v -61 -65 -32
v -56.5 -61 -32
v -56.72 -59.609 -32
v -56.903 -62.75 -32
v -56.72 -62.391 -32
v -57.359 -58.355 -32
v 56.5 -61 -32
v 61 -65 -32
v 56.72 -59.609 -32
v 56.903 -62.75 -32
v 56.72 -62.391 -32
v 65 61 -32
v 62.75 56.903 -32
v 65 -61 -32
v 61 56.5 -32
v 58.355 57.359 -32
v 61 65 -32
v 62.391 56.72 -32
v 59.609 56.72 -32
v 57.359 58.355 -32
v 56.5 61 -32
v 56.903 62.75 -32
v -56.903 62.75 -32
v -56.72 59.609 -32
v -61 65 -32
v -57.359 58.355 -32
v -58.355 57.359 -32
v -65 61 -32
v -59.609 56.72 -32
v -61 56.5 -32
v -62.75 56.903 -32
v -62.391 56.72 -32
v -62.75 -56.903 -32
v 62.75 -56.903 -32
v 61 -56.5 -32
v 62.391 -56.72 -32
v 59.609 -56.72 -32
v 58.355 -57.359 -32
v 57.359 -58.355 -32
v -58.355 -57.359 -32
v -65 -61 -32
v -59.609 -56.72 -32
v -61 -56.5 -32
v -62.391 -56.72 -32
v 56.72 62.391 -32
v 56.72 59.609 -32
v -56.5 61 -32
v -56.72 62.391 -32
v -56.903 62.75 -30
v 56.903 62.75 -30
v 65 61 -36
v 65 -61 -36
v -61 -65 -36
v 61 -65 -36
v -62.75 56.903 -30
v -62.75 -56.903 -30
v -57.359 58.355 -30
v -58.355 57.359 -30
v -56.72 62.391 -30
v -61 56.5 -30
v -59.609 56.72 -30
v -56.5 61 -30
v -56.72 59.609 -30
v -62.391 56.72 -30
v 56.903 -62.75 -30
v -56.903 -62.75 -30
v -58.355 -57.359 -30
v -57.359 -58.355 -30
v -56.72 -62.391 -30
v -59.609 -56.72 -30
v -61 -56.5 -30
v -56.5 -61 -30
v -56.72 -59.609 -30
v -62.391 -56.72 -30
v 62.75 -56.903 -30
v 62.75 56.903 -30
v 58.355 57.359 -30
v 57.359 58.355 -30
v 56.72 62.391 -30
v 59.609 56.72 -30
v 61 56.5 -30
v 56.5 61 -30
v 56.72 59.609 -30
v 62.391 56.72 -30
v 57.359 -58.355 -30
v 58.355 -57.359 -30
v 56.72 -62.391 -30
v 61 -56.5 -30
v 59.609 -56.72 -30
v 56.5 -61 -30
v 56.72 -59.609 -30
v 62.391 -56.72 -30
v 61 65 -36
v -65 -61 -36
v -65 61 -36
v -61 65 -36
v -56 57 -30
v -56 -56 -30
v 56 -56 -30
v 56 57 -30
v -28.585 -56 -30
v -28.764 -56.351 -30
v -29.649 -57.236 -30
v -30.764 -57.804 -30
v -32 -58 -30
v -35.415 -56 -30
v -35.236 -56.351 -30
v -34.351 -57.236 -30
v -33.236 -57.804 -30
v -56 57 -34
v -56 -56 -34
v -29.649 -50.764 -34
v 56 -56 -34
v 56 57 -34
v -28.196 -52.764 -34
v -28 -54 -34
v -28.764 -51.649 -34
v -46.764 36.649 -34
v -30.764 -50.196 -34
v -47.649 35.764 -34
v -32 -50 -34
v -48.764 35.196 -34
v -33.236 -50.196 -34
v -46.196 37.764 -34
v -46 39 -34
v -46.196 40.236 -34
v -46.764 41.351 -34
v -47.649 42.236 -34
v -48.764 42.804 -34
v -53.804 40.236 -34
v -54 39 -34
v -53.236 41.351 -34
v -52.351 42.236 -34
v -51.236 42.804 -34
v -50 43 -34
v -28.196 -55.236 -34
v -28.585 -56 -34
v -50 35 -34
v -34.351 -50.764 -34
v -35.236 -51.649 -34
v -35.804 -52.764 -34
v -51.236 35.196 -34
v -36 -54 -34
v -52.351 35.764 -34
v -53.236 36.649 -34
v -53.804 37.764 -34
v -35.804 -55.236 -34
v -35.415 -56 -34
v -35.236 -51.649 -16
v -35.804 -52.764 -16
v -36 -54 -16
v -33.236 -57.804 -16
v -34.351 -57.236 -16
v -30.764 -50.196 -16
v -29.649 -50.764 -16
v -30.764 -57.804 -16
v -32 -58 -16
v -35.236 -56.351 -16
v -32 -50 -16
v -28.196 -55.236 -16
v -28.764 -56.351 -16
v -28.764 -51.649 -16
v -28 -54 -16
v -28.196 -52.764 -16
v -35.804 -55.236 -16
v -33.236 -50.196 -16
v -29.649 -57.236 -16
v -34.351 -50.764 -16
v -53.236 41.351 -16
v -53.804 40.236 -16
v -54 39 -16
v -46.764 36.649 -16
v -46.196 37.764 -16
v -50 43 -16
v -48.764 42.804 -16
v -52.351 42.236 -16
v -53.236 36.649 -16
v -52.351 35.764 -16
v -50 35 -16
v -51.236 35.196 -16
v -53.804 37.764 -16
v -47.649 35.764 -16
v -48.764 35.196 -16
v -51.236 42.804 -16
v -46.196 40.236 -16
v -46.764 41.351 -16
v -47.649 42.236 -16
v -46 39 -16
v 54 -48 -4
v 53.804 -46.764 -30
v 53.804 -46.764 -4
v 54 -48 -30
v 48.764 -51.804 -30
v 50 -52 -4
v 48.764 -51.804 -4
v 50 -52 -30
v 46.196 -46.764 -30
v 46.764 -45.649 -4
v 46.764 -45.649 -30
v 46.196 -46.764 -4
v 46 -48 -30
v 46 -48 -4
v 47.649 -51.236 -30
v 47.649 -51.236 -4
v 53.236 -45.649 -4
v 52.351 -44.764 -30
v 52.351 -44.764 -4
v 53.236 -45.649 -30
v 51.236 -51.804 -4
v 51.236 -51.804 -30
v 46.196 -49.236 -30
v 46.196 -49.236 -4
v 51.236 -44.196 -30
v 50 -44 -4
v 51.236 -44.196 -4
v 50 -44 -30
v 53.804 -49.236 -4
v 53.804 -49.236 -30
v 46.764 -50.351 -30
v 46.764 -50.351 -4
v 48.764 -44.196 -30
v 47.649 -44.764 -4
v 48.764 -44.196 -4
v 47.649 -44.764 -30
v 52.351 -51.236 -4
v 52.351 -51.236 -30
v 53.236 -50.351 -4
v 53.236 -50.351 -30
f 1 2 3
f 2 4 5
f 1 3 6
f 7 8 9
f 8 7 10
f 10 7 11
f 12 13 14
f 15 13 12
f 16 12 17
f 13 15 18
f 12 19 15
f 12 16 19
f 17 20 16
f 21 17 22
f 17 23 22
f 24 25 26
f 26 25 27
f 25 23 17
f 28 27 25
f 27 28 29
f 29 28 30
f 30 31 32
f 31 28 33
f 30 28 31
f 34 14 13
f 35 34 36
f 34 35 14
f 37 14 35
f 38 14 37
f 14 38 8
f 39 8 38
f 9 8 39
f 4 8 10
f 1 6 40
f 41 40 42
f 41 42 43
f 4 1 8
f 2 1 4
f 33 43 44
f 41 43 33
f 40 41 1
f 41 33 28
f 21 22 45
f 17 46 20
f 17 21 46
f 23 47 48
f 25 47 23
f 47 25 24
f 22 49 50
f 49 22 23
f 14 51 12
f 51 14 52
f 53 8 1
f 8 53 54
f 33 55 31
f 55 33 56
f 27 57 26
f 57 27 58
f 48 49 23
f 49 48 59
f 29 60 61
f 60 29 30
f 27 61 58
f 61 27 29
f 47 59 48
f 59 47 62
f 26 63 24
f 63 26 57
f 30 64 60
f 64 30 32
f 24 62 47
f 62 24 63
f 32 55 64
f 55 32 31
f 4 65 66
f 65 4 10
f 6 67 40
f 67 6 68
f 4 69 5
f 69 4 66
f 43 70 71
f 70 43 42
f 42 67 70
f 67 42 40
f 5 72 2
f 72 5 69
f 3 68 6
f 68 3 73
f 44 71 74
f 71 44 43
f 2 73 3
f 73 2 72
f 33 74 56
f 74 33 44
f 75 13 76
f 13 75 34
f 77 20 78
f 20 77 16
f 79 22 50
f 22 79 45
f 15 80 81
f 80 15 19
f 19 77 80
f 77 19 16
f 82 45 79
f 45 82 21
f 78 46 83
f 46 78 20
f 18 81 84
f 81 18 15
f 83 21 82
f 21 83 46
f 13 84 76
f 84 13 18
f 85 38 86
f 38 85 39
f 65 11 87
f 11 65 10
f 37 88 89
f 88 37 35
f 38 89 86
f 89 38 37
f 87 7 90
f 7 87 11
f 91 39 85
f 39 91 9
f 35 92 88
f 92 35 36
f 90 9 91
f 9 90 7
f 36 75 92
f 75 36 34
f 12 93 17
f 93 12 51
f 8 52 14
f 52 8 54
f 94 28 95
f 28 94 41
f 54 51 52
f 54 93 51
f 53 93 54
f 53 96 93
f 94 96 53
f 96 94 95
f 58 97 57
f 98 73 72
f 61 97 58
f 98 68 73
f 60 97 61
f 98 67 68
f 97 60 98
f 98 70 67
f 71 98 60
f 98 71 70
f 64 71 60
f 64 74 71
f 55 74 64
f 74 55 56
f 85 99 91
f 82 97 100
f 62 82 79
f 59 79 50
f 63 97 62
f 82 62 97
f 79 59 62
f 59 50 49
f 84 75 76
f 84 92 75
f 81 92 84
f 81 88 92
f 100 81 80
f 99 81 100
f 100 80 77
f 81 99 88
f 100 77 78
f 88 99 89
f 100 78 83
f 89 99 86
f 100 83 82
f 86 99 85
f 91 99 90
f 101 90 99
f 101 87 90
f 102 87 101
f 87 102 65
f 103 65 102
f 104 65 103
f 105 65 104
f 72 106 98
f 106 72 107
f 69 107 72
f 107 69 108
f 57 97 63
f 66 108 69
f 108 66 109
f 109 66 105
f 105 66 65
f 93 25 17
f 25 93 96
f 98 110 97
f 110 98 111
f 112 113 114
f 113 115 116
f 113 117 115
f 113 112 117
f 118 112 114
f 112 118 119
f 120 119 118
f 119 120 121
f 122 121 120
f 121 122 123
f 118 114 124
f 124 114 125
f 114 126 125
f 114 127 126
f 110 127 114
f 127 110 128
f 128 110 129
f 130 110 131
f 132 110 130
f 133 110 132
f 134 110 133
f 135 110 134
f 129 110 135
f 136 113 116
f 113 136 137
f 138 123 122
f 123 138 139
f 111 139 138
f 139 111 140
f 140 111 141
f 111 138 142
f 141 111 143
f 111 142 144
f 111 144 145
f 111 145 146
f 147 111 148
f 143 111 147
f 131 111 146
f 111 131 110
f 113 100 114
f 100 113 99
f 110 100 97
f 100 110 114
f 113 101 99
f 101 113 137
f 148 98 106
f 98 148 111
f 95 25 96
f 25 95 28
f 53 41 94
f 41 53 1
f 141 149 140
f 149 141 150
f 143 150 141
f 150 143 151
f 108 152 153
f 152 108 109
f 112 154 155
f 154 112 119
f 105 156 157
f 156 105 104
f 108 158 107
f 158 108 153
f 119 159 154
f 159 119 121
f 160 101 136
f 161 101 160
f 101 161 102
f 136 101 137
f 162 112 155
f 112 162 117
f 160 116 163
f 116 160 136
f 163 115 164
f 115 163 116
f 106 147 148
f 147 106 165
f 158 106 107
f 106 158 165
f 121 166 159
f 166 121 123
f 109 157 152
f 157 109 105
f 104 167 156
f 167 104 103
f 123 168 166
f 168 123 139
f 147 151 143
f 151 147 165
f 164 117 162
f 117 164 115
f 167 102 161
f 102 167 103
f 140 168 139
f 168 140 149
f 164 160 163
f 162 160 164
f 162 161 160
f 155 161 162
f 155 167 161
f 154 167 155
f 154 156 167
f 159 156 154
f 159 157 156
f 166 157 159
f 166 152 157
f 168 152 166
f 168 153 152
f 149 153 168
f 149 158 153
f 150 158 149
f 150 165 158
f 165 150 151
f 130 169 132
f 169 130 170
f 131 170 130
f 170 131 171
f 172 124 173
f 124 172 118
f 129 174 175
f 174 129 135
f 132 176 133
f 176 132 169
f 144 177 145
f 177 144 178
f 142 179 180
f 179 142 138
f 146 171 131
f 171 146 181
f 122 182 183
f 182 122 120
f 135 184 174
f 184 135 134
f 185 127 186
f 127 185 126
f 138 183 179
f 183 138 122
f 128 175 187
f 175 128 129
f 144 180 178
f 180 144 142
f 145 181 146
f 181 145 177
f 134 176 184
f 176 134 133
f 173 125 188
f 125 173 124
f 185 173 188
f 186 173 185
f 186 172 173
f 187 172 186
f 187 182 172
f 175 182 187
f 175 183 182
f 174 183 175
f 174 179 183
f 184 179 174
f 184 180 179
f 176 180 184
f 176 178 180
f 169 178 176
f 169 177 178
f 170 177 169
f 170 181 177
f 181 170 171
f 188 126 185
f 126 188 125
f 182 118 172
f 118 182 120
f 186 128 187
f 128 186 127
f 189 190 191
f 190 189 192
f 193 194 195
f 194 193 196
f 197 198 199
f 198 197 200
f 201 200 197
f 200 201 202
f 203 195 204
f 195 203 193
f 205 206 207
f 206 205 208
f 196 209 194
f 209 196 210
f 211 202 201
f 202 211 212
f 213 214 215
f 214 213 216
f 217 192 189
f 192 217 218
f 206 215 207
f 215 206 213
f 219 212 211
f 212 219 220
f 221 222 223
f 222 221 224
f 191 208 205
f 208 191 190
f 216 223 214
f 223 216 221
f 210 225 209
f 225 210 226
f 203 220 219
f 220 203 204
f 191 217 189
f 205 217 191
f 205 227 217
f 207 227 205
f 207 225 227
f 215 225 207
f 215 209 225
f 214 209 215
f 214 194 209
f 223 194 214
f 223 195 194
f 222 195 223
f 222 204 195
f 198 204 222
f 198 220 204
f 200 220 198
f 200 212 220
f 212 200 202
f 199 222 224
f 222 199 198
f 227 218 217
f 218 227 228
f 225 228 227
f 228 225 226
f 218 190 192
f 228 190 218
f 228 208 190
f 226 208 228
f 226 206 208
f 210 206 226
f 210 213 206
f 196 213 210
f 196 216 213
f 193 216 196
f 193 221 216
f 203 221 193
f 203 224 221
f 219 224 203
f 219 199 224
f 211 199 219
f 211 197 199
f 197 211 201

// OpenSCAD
base_thickness = 2;
standoff_height = 8;
base_width = 130;
base_height = 130;
bottom_wall_height = 30;
wall_thickness = 2;
top_offset = -2;
//top_offset = 10;

$fn=20;


module bottom() {
    color("Green") {
        translate([-(base_width/2),-(base_height/2),0]) {
            cube([base_width, base_height, base_thickness]);
        }
    }
}

module arduino_standoffs() {
    // relay standoffs
    color("Yellow") {
        translate([10, 53, 0]) {
            cylinder(h=standoff_height, r=4);
        }
        translate([15, 0, 0]) {
            cylinder(h=standoff_height, r=4);
        }
        translate([43, 0, 0]) {
            cylinder(h=standoff_height, r=4);
        }
        translate([58, 50, 0]) {
            cylinder(h=standoff_height, r=4);
        }        
    }
    color("Orange") {
        translate([10, 53, standoff_height]) {
            cylinder(h=4, r=1);
        }
        translate([15, 0, standoff_height]) {
            cylinder(h=4, r=1);
        }
        translate([43, 0, standoff_height]) {
            cylinder(h=4, r=1);
        }
        translate([58, 50, standoff_height]) {
            cylinder(h=4, r=1);
        }        
    }
} 

module relay_standoffs() {
    color("Red") {
        translate([0, 0, 0]) {
            cylinder(h=standoff_height, r=4);
        }
        translate([0, 28, 0]) {
            cylinder(h=standoff_height, r=4);
        }
        translate([22, 0, 0]) {
            cylinder(h=standoff_height, r=4);
        }
        translate([22, 28, 0]) {
            cylinder(h=standoff_height, r=4);
        }        
    }
    color("Purple") {
        translate([0, 0, standoff_height]) {
            cylinder(h=4, r=1);
        }
        translate([0, 28, standoff_height]) {
            cylinder(h=4, r=1);
        }
        translate([22, 0, standoff_height]) {
            cylinder(h=4, r=1);
        }
        translate([22, 28, standoff_height]) {
            cylinder(h=4, r=1);
        }        
    }
}    
  

module transformer_standoffs() {
    color("Red") {
        translate([0, 0, 0]) {
            cylinder(h=standoff_height, r=4);
        }
        translate([-7, 54.5, 0]) {
            cylinder(h=standoff_height, r=4);
        }   
        translate([7, 54.5, 0]) {
            cylinder(h=standoff_height, r=4);
        }  
    }
    color("Purple") {
        translate([0, 0, standoff_height]) {
            cylinder(h=4, r=1.5);
        }
        difference() {
            translate([7, 54.5, standoff_height]) {
                cylinder(h=4, r=2);
            }   
            translate([5, 50.5, standoff_height]) {
                cube([4,4,8]);
            }  
        }   
        difference() {
            translate([-7, 54.5, standoff_height]) {
                cylinder(h=4, r=2);
            }   
            translate([-9, 50.5, standoff_height]) {
                cube([4,4,8]);
            }  
        }        
    } 
}    

module wall(height) {
    color("Blue") {
        cube([base_width, wall_thickness, height]);
    }
}

module duct() {
    rotate([90,0,0]) {
        color("Red") {
            cylinder(h=10, r=10);
        }
        translate([-10, -18, 0]) {
            // width, height, depth
            cube([20, 15, 10]);
        }
    }
}

module right_wall() {
    difference() {
        union() {
            translate([-base_height/2, base_height/2-wall_thickness, base_thickness]) {
                wall(bottom_wall_height);
            }
            translate([8, base_width/2+wall_thickness-4, 20]) {
                duct();
            }
        }
        union() {
            translate([8,0,0]) {
                translate([0, base_width/2+wall_thickness, 24]) {
                    rotate([90,0,0]) {
                        color("Purple") {
                            cylinder(h=25, r=9);
                        }
                    }
                }
                translate([-10, base_width/2+wall_thickness-4, 17]) {
                    rotate([90,0,0]) {
                        color("Yellow") {
                            cube([20, 20, 23]);
                        }
                    }
                }  
                translate([-12, base_width/2+wall_thickness-9, 10]) {
                    rotate([0,90,0]) {
                        color("Green") {
                            cylinder(h=30, r=3);
                        }
                    }
                }   
            }
        }     
    }
}

module screw_mount() {
    translate([base_width/2-4, base_width/2-4, base_thickness]) {
        color("Blue") {
            rotate([0, 0, 90]) {
                cylinder(h=bottom_wall_height, r=4);
            }
        }
    }
}

module serial_plug_mount() {
    // external serial connection
    translate([-55, -65, base_thickness]) {
        rotate([0, 0, 90]) {
            cube([10, 10, 3]);
        }
    } 
    translate([-35, -65, base_thickness]) {
        rotate([0, 0, 90]) {
            cube([10, 10, 3]);
        }
    } 
    translate([-35, -65, base_thickness+3]) {
        rotate([0, 0, 90]) {
            cube([7, 30, 3]);
        }
    } 
    translate([-45, -55, base_thickness]) {
        color("Red") {
            rotate([0, 0, 90]) {
                cube([3, 10, 1]);
            }
        }
    }     
}

module corner_bevel() {
    translate([base_width/2+2, base_height/2-6, -5]) {
        rotate([0, 0, 45]) {
            cube([5, 20, base_thickness+bottom_wall_height*5]);
        }
    }
}

module top_bezel_edges() {
    // bezel
    translate([base_width/2, base_width/2-wall_thickness-.25, bottom_wall_height + top_offset]) {
        rotate([0, 0, 90]) {
            cube([wall_thickness*3,base_width,base_thickness*2]);
        }
    }
    rotate([0,0,90]) {
        translate([base_width/2, -base_width/2-wall_thickness+.25, bottom_wall_height + top_offset]) {
            rotate([0, 0, 90]) {
                cube([wall_thickness*2,base_width,base_thickness*2]);
            }
        }   
    }
}

module top_bezel_total() {
    // screw mount offsets
    translate([base_width/2-4, base_width/2-4, bottom_wall_height + top_offset]) {
        rotate([0, 0, 90]) {
            cylinder(h=base_thickness*2, r=4.5);
        }
    }
    top_bezel_edges();    
}

module top() {
    union() {
        // transformer push-down
        color("Orange") {
            translate([39-7, -49-5, top_offset + standoff_height + 10]) {
                cylinder(h=bottom_wall_height-16 + 4 - standoff_height + 8, r=4);
            }
        }
        
        // relay push-down
        color("Orange") {
            translate([50, 47-8, top_offset + standoff_height + 10]) {
                cylinder(h=bottom_wall_height-16 + 4 - standoff_height + 8, r=4);
            }
        }
        
        // SerialPort push-down
        translate([-42-8, -30-18, top_offset + standoff_height + 10-12]) {
            cylinder(h=bottom_wall_height-16 + 12 - standoff_height + 8, r=4);
        }
      
        difference() {
            color("Purple") {
                translate([-(base_width/2),-(base_height/2),bottom_wall_height + 2 + top_offset]) {
                    cube([base_width, base_height, base_thickness*3]);
                }
            }    
      
            color("Red") {
                translate([-(base_width/2-9),-(base_height/2-9),bottom_wall_height + 2 + top_offset]) {
                    cube([base_width-18, base_height-17, base_thickness*2]);
                }
            }   
            
            top_bezel_total();
            mirror([0,1,0]) {
                top_bezel_total();
            }
            mirror([1,0,0]) {
                top_bezel_total();
                mirror([0,1,0]) {
                    top_bezel_total();
                }
            }   
     
            corner_bevel();
            mirror([0,1,0]) {
                corner_bevel();
            }
            mirror([1,0,0]) {
                corner_bevel();
                mirror([0,1,0]) {
                    corner_bevel();
                }
            }       
        }
    }
}

 
 
    

//////////////////////////////////////////////////////////////
// START RENDERING
//////////////////////////////////////////////////////////////

module topAndBottom() {
    difference() {
        union() {
            right_wall();
            mirror([0,1,0]) {
                right_wall();
            }
            // back
            translate([-base_height/2+2, -base_height/2, base_thickness]) {
                rotate([0,0,90]) {
                    wall(bottom_wall_height);
                }
            }
            
            // front
            translate([base_height/2, -base_height/2, base_thickness]) {
                rotate([0,0,90]) {
                    wall(bottom_wall_height);
                }
            }
            bottom();
            
            serial_plug_mount();
            
            translate([28, 19, base_thickness]) {
                relay_standoffs();
            }
            translate([39, -49, base_thickness]) {
                transformer_standoffs();
            }
            translate([-57, -30, base_thickness]) {
                arduino_standoffs();
            }
            
            screw_mount();
            mirror([0,1,0]) {
                screw_mount();
            }
            mirror([1,0,0]) {
                screw_mount();
                mirror([0,1,0]) {
                    screw_mount();
                }
            }   
            
            top();
            
        }
       
        // wall holes
        translate([-25, -60, 25]) {
            rotate([90, 0, 0]) {
                cylinder(h=10, r=4);
            }
        }
        translate([-25, -60, 21]) {
            rotate([90, 0, 0]) {
                cylinder(h=10, r=3);
            }
        }
        translate([-40, -60, 21]) {
            rotate([90, 0, 0]) {
                cylinder(h=10, r=4);
            }
        }
        translate([-45, -70, base_thickness]) {
            rotate([0, 0, 90]) {
                cube([20, 10, 3]);
            }
        } 
    
        corner_bevel();
        mirror([0,1,0]) {
            corner_bevel();
        }
        mirror([1,0,0]) {
            corner_bevel();
            mirror([0,1,0]) {
                corner_bevel();
            }
        }
        
        translate([-13, base_width/2+wall_thickness, base_thickness+standoff_height+8]) {
            rotate([90,0,0]) {
                color("Red") {
                    cylinder(h=25, r=9);
                }
            }
        }     
    }
}

rotate([0,180,0]) {
    top();
}
//topAndBottom();

    



 
